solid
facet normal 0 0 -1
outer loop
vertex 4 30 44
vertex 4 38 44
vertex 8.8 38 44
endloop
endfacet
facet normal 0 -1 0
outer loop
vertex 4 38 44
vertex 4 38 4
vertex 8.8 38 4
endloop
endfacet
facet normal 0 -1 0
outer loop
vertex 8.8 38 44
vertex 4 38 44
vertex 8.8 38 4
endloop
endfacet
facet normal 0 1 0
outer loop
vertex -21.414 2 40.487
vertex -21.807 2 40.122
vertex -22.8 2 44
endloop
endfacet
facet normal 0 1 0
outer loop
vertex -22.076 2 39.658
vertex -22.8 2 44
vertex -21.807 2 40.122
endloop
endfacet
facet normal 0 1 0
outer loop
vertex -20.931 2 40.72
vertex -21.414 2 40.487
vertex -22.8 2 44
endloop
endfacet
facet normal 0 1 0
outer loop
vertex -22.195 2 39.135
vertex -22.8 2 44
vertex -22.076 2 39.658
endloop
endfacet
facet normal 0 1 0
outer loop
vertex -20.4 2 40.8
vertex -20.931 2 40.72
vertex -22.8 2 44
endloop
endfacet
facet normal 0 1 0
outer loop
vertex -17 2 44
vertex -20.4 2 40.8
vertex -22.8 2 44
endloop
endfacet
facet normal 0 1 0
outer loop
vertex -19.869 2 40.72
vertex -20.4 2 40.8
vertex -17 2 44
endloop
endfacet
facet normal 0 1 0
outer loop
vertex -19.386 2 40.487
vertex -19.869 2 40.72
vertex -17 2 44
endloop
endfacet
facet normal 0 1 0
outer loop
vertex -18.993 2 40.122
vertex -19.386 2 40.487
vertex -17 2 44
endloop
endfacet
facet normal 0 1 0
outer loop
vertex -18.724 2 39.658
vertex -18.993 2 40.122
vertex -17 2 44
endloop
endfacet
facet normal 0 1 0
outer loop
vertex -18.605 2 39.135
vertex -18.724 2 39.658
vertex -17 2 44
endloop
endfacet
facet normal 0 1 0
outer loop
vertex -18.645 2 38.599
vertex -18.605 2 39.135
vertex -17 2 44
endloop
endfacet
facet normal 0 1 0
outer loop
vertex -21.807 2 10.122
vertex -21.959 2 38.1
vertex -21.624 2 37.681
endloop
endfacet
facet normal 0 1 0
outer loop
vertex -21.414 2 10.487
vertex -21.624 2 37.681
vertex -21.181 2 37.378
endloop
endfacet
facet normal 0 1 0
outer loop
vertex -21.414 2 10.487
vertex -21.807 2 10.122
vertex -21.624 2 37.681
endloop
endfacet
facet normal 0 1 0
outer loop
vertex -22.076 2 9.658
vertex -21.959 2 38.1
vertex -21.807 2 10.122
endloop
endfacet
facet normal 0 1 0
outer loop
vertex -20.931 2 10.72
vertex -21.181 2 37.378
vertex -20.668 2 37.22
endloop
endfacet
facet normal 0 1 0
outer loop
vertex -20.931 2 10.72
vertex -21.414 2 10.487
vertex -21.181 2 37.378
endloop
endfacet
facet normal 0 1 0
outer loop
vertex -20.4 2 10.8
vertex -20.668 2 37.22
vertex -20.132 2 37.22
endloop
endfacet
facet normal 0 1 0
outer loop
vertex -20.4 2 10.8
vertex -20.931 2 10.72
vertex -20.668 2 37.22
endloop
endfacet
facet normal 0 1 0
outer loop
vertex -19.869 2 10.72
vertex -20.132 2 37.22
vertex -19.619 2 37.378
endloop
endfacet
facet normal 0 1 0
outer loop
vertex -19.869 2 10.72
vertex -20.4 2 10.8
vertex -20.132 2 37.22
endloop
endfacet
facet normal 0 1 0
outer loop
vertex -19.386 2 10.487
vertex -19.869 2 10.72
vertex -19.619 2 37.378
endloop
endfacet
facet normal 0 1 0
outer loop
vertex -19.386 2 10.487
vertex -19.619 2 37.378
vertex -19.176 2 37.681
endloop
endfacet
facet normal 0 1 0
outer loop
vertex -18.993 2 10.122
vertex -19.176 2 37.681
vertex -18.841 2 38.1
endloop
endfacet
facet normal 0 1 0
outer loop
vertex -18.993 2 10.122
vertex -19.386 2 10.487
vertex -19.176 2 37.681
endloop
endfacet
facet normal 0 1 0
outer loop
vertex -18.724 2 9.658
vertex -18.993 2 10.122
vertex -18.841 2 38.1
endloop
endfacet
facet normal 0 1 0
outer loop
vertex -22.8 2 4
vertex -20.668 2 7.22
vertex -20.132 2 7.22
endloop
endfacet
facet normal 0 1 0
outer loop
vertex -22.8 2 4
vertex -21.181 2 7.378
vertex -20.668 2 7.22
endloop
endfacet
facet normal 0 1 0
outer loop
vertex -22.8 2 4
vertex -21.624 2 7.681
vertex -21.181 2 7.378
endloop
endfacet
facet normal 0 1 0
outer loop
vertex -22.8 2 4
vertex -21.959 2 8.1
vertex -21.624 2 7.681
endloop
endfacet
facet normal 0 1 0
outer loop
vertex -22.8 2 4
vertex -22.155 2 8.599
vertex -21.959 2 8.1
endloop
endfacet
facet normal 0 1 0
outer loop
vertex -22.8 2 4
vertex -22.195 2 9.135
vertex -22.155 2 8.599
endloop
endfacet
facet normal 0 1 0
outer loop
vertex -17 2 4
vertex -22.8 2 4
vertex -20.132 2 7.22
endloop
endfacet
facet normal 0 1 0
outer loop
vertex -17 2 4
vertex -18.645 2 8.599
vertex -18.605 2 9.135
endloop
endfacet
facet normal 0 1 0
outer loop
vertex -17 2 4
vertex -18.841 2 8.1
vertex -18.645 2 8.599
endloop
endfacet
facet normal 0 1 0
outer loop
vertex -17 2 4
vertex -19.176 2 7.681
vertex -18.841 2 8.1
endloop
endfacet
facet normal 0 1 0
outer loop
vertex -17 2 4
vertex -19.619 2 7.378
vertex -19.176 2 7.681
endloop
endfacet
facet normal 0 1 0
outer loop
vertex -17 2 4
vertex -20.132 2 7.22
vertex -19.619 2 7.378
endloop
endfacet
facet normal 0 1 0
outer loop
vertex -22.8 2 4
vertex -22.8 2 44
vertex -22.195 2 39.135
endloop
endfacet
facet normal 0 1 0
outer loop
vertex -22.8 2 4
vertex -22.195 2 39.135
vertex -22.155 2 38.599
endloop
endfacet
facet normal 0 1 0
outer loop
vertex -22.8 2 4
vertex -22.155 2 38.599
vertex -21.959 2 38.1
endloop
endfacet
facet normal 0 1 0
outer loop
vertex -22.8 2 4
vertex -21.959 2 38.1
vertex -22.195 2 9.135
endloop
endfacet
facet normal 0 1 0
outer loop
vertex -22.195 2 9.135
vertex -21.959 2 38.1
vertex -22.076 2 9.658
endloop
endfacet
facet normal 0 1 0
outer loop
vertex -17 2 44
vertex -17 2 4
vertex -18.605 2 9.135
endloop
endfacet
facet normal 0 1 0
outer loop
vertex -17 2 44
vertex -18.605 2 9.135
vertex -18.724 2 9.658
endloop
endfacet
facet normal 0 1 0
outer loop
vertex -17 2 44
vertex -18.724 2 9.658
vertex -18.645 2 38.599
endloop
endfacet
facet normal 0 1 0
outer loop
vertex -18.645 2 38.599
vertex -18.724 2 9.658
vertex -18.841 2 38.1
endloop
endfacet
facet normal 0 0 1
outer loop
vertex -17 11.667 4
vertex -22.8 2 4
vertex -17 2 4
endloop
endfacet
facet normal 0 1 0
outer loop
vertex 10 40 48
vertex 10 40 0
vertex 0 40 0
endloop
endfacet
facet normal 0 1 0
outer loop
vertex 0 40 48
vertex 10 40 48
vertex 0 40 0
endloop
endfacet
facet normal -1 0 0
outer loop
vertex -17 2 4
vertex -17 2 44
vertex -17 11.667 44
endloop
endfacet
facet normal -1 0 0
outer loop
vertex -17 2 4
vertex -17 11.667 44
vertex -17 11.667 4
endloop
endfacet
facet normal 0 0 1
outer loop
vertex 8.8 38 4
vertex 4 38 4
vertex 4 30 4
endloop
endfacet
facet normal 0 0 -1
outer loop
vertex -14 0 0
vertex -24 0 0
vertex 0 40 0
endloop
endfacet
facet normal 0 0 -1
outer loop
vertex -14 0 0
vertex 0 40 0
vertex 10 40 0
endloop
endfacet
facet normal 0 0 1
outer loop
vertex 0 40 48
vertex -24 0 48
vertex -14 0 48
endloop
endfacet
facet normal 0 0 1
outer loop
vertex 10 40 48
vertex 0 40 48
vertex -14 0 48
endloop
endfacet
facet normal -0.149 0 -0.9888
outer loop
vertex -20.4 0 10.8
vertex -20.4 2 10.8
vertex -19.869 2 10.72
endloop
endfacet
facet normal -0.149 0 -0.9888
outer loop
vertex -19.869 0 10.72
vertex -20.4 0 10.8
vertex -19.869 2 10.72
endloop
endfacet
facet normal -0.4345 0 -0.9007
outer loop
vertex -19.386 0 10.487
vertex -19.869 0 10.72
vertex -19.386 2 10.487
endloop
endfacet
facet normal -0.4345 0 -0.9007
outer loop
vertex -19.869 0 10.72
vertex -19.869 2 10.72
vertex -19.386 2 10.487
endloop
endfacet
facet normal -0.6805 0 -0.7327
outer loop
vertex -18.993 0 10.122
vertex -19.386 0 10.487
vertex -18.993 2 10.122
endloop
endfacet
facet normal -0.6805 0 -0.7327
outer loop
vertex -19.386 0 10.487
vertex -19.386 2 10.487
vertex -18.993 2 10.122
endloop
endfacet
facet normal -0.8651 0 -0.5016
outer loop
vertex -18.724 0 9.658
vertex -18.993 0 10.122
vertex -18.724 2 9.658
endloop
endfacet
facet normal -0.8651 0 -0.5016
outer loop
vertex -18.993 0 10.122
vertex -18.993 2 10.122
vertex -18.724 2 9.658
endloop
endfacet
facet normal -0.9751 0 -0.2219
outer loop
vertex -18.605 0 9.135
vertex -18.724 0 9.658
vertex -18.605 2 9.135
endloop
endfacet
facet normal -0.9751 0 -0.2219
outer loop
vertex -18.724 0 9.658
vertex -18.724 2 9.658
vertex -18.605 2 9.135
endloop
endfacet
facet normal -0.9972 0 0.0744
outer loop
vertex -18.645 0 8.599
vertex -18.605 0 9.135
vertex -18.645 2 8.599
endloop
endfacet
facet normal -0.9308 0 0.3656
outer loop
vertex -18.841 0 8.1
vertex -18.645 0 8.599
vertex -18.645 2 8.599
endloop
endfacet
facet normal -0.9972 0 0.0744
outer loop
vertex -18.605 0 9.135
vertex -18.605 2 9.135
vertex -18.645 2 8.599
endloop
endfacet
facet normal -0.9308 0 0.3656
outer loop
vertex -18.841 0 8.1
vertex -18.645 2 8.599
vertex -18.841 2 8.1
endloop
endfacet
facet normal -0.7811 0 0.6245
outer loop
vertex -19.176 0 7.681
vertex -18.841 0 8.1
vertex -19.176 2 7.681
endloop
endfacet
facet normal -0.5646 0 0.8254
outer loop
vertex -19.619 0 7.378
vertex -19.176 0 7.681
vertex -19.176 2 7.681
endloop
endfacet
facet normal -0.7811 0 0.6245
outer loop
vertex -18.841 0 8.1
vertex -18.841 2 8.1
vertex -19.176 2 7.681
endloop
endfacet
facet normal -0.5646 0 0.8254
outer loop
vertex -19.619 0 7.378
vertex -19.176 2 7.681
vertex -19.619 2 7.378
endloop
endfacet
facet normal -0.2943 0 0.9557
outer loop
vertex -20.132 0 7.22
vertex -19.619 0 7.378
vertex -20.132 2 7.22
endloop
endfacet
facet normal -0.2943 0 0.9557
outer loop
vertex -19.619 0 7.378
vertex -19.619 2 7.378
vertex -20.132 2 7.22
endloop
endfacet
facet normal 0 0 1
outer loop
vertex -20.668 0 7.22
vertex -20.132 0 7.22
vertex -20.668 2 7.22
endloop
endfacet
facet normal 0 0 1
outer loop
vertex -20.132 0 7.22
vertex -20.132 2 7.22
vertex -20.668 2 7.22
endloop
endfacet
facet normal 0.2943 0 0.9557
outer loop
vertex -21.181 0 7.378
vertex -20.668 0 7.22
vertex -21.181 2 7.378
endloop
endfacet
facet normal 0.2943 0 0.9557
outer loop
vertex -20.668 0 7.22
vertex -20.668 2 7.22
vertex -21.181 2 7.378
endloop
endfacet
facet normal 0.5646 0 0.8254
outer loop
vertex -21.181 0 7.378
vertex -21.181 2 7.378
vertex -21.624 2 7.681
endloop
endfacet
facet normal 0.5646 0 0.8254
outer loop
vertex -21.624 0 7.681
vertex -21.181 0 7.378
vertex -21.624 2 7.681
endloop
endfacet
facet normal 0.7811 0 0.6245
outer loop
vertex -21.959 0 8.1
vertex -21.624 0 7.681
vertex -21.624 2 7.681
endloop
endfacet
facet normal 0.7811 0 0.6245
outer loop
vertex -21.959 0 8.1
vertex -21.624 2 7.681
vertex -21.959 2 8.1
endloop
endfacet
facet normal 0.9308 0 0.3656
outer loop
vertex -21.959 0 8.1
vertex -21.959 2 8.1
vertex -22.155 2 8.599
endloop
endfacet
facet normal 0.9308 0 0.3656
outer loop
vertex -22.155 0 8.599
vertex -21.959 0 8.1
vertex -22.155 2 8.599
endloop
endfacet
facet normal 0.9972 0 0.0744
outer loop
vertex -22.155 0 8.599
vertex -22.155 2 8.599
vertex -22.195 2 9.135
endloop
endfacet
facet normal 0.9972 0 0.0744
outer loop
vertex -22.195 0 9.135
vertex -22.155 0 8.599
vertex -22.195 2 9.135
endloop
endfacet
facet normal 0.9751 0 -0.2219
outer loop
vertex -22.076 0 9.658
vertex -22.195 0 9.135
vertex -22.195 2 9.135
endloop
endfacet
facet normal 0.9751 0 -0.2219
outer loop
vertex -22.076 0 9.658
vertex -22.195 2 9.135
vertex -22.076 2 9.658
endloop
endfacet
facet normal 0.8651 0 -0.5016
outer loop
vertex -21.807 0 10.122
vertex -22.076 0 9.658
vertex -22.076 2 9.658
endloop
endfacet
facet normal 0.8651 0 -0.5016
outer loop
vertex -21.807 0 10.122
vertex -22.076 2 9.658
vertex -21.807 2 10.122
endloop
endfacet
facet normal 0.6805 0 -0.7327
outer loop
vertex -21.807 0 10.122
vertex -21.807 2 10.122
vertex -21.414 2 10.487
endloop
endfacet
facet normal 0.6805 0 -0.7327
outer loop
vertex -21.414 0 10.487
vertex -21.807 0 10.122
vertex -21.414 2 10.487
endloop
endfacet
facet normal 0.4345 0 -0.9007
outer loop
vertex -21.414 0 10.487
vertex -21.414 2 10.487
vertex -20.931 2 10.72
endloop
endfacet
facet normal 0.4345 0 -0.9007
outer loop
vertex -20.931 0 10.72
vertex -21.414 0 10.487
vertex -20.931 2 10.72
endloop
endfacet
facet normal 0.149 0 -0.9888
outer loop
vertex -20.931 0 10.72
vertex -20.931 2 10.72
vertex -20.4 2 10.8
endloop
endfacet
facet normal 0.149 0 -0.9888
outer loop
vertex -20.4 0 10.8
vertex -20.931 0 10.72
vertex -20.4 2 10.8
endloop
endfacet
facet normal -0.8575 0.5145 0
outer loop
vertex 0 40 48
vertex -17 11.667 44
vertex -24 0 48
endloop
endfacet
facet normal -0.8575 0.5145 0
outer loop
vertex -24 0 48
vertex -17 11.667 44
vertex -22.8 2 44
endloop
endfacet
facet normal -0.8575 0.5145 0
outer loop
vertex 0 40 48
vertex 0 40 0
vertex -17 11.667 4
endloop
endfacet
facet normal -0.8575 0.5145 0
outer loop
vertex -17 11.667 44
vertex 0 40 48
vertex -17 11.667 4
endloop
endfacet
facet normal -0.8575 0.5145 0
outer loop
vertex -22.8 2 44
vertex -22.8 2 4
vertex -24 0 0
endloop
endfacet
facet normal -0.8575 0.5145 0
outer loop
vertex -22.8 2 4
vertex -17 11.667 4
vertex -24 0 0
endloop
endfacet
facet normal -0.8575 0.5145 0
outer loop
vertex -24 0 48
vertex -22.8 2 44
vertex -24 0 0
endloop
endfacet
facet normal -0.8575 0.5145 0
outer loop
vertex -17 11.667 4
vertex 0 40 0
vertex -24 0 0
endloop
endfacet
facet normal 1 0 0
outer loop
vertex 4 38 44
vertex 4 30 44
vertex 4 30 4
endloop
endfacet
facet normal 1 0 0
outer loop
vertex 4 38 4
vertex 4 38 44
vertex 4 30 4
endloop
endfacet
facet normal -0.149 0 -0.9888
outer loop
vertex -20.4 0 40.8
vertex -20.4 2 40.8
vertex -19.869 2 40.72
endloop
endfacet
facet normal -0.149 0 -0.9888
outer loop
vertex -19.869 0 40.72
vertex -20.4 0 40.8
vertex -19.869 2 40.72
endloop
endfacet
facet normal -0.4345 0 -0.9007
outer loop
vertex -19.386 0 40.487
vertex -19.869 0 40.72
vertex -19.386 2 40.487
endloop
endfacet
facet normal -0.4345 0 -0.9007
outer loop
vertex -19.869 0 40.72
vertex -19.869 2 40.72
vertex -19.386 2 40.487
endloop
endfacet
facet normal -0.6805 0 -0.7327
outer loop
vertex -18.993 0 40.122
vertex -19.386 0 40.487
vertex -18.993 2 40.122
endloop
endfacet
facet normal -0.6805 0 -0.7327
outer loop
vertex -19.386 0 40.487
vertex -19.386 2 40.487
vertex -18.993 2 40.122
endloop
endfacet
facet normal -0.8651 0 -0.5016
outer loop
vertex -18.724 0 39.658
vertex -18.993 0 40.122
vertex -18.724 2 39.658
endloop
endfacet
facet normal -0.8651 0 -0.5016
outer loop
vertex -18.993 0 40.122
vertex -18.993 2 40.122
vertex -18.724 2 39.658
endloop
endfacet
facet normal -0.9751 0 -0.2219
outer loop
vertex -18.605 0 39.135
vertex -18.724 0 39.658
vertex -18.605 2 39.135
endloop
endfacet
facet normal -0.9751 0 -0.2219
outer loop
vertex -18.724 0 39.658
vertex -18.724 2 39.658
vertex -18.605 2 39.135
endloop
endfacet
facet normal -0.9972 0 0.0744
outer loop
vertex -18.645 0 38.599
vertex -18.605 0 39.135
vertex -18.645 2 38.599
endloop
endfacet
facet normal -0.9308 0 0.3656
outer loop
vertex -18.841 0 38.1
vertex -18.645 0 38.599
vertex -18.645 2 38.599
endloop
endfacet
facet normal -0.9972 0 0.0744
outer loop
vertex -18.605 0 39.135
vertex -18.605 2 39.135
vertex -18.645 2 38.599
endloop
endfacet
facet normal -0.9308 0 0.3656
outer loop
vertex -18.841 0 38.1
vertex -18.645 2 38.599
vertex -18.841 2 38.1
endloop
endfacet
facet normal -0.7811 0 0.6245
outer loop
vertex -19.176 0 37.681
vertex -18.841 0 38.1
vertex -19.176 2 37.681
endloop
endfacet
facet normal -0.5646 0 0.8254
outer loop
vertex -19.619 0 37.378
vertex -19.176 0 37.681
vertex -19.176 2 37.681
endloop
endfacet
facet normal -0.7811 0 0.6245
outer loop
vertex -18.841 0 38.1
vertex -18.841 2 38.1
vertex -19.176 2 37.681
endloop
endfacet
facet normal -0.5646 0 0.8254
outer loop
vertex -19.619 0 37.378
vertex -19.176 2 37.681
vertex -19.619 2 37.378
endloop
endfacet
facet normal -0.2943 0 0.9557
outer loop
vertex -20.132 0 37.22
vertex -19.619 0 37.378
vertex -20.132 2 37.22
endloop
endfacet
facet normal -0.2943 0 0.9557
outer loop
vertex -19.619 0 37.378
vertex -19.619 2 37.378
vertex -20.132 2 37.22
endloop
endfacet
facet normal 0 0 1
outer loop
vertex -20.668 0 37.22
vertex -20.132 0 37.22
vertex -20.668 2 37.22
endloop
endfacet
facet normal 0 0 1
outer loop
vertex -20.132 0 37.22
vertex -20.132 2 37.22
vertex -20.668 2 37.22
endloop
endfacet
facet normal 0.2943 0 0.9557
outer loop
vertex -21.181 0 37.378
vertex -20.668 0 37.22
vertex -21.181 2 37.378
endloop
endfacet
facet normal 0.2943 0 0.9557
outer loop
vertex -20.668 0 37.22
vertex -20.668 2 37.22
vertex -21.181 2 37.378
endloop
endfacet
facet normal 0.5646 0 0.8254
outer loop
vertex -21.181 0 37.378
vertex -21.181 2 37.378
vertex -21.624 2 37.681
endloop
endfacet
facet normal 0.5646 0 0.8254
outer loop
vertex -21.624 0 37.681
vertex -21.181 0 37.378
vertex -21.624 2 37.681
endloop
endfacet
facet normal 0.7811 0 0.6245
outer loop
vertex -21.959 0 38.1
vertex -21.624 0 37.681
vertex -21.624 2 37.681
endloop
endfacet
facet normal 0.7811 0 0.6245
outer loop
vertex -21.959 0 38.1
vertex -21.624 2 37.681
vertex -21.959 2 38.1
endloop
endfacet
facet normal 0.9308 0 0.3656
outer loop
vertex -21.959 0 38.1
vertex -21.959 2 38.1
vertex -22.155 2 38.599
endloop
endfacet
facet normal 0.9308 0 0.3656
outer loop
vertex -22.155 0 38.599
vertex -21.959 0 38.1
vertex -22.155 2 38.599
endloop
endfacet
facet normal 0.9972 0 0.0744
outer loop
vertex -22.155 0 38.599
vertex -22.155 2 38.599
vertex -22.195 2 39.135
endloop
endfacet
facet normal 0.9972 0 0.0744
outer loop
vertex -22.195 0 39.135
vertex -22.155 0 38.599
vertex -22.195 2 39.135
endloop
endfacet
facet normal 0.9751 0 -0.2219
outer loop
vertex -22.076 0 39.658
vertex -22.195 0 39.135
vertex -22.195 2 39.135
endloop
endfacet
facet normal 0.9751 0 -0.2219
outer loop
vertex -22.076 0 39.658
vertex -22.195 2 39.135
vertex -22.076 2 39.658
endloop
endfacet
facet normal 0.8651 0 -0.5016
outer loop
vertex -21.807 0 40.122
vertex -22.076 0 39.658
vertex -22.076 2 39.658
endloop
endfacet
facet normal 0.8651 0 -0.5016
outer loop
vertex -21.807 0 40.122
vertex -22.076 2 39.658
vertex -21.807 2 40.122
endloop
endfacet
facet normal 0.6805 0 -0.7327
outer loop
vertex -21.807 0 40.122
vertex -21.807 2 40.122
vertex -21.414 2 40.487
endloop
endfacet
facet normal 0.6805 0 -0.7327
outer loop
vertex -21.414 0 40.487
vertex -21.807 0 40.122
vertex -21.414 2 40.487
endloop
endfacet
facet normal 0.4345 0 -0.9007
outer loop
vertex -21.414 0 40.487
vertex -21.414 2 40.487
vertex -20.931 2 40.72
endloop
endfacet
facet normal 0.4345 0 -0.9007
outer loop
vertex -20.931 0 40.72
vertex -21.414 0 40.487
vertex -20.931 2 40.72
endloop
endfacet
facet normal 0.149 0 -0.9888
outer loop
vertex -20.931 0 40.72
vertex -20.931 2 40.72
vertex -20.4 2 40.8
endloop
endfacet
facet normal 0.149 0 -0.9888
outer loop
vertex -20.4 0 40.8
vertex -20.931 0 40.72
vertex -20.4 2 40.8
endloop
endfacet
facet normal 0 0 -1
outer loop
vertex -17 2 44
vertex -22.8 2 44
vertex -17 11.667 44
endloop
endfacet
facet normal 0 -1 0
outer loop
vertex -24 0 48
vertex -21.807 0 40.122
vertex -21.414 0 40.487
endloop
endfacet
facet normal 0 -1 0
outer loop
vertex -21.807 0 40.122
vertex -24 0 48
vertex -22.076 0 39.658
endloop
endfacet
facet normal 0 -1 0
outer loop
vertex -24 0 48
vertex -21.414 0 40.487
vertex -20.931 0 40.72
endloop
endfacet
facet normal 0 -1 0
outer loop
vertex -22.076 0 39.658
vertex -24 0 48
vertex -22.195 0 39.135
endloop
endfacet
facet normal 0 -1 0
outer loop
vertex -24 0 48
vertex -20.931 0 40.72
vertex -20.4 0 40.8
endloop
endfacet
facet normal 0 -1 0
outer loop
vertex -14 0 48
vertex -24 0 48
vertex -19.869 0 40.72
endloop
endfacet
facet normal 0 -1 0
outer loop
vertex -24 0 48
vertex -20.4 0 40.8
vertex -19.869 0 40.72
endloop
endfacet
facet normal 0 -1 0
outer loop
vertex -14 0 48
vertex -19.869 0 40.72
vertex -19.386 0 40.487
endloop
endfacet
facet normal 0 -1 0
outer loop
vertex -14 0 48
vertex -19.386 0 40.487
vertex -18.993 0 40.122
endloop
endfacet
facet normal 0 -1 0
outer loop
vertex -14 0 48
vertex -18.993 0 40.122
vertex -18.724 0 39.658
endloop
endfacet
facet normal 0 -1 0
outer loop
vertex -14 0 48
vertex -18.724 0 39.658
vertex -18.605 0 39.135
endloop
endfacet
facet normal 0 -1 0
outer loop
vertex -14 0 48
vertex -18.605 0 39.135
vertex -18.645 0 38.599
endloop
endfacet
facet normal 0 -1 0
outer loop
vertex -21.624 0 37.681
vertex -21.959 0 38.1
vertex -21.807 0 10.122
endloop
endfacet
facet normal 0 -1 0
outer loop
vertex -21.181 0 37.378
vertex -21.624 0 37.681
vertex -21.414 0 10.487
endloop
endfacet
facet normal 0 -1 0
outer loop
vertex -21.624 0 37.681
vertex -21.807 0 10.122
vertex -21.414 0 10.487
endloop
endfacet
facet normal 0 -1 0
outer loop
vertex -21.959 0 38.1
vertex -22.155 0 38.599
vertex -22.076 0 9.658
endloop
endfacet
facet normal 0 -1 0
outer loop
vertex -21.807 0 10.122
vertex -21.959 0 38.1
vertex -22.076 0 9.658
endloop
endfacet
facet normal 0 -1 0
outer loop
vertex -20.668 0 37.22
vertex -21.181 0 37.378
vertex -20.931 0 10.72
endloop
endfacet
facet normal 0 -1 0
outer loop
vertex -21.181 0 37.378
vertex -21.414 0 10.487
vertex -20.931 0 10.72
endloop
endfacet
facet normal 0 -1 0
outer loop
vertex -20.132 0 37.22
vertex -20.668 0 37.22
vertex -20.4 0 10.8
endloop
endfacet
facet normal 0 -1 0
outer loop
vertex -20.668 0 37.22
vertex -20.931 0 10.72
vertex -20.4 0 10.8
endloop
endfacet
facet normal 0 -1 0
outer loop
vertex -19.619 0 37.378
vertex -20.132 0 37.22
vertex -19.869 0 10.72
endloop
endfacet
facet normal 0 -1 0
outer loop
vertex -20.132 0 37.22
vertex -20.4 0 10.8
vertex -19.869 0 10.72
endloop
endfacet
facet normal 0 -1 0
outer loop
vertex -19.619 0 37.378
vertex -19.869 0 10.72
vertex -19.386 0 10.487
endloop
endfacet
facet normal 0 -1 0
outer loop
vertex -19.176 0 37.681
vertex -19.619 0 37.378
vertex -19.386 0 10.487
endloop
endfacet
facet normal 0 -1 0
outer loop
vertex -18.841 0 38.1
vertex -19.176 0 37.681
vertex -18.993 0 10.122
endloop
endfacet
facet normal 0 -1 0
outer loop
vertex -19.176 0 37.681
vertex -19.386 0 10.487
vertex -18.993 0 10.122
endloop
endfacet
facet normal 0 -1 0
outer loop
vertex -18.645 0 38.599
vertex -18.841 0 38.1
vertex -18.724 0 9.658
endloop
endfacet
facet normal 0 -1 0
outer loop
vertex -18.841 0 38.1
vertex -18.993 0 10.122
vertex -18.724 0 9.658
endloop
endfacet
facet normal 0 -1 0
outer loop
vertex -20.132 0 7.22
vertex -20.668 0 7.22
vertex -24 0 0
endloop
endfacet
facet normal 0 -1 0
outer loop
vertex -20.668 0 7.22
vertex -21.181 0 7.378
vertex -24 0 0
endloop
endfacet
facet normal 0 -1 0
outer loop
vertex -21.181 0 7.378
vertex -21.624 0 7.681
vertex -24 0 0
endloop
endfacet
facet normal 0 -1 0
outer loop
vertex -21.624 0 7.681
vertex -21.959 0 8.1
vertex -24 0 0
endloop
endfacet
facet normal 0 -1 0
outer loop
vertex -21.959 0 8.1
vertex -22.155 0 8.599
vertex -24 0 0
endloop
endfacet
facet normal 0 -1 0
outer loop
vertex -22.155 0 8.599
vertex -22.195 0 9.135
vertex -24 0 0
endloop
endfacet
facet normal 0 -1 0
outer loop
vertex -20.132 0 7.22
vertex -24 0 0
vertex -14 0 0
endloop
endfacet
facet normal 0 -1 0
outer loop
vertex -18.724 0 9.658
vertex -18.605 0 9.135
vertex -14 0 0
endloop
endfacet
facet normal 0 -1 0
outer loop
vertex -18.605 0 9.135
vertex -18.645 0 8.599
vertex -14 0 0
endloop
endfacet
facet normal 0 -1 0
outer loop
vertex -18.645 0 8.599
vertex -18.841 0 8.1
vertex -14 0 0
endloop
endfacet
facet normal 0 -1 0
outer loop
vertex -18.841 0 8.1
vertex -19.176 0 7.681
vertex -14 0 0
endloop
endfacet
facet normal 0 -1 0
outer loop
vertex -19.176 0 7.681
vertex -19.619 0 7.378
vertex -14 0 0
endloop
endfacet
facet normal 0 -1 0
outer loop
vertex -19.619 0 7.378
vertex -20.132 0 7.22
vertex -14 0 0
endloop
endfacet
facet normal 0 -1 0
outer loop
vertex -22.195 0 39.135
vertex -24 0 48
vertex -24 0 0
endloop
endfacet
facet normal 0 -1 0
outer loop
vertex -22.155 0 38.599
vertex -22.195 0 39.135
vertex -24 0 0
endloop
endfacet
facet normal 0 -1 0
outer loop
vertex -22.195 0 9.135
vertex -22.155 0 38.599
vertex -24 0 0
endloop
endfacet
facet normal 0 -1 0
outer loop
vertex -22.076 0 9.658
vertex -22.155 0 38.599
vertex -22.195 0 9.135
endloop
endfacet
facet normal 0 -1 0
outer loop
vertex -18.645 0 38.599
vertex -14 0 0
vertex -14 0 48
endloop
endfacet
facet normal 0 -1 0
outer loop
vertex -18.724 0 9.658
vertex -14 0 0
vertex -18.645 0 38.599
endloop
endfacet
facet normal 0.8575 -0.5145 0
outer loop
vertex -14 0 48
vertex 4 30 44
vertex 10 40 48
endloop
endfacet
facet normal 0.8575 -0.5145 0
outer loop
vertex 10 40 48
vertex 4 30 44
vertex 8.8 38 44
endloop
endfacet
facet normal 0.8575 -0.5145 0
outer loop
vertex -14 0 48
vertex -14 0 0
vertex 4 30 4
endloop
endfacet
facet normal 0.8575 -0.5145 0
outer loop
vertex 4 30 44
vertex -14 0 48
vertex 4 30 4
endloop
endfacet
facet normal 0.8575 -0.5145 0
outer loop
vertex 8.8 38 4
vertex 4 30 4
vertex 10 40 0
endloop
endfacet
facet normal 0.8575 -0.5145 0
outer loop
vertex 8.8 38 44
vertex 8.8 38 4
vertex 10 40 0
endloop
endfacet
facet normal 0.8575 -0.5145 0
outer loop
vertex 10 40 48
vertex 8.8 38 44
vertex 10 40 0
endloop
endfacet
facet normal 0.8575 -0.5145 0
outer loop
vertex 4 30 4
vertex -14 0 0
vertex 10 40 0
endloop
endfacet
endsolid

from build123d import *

# Parameters (mm, degrees)
EXTRUDE_1_DEPTH     = 48
CUT_EXTRUDE_START   = 2
SKETCH_2_W          = 14
SKETCH_2_H          = 40
CUT_EXTRUDE_1_DEPTH = 48
SKETCH_3_W          = 12
SKETCH_3_H          = 40
CUT_EXTRUDE_2_DEPTH = 38
SKETCH_4_R          = 1.8
CUT_EXTRUDE_3_DEPTH = 38


with BuildPart() as part:
    # 草图1 → 凸台-拉伸1 (new body)
    with BuildSketch(Plane.XY):
        Polygon((-24, 0), (-14, 0), (10, 40), (0, 40), align=None)
    extrude(amount=EXTRUDE_1_DEPTH)

    # 草图2 → 切除-拉伸1 (cut)
    with BuildSketch(Plane(origin=(0, 0, 0), x_dir=(1, 0, 0), z_dir=(0, 1, 0)).offset(CUT_EXTRUDE_START)):
        with Locations((-24, -24)):
            Rectangle(SKETCH_2_W, SKETCH_2_H)
    extrude(amount=CUT_EXTRUDE_1_DEPTH, mode=Mode.SUBTRACT)

    # 草图3 → 切除-拉伸2 (cut)
    with BuildSketch(Plane(origin=(0, 0, 0), x_dir=(1, 0, 0), z_dir=(0, 1, 0))):
        with Locations((10, -24)):
            Rectangle(SKETCH_3_W, SKETCH_3_H)
    extrude(amount=CUT_EXTRUDE_2_DEPTH, mode=Mode.SUBTRACT)

    # 草图4 → 切除-拉伸3 (cut)
    with BuildSketch(Plane(origin=(0, 2, 0), x_dir=(1, 0, 0), z_dir=(0, 1, 0))):
        with Locations(Location((-20.4, -9, 0), (0, 0, 270))):
            Circle(SKETCH_4_R)
        with Locations(Location((-20.4, -39, 0), (0, 0, 270))):
            Circle(SKETCH_4_R)
    extrude(amount=-CUT_EXTRUDE_3_DEPTH, mode=Mode.SUBTRACT)


solid = part.part
